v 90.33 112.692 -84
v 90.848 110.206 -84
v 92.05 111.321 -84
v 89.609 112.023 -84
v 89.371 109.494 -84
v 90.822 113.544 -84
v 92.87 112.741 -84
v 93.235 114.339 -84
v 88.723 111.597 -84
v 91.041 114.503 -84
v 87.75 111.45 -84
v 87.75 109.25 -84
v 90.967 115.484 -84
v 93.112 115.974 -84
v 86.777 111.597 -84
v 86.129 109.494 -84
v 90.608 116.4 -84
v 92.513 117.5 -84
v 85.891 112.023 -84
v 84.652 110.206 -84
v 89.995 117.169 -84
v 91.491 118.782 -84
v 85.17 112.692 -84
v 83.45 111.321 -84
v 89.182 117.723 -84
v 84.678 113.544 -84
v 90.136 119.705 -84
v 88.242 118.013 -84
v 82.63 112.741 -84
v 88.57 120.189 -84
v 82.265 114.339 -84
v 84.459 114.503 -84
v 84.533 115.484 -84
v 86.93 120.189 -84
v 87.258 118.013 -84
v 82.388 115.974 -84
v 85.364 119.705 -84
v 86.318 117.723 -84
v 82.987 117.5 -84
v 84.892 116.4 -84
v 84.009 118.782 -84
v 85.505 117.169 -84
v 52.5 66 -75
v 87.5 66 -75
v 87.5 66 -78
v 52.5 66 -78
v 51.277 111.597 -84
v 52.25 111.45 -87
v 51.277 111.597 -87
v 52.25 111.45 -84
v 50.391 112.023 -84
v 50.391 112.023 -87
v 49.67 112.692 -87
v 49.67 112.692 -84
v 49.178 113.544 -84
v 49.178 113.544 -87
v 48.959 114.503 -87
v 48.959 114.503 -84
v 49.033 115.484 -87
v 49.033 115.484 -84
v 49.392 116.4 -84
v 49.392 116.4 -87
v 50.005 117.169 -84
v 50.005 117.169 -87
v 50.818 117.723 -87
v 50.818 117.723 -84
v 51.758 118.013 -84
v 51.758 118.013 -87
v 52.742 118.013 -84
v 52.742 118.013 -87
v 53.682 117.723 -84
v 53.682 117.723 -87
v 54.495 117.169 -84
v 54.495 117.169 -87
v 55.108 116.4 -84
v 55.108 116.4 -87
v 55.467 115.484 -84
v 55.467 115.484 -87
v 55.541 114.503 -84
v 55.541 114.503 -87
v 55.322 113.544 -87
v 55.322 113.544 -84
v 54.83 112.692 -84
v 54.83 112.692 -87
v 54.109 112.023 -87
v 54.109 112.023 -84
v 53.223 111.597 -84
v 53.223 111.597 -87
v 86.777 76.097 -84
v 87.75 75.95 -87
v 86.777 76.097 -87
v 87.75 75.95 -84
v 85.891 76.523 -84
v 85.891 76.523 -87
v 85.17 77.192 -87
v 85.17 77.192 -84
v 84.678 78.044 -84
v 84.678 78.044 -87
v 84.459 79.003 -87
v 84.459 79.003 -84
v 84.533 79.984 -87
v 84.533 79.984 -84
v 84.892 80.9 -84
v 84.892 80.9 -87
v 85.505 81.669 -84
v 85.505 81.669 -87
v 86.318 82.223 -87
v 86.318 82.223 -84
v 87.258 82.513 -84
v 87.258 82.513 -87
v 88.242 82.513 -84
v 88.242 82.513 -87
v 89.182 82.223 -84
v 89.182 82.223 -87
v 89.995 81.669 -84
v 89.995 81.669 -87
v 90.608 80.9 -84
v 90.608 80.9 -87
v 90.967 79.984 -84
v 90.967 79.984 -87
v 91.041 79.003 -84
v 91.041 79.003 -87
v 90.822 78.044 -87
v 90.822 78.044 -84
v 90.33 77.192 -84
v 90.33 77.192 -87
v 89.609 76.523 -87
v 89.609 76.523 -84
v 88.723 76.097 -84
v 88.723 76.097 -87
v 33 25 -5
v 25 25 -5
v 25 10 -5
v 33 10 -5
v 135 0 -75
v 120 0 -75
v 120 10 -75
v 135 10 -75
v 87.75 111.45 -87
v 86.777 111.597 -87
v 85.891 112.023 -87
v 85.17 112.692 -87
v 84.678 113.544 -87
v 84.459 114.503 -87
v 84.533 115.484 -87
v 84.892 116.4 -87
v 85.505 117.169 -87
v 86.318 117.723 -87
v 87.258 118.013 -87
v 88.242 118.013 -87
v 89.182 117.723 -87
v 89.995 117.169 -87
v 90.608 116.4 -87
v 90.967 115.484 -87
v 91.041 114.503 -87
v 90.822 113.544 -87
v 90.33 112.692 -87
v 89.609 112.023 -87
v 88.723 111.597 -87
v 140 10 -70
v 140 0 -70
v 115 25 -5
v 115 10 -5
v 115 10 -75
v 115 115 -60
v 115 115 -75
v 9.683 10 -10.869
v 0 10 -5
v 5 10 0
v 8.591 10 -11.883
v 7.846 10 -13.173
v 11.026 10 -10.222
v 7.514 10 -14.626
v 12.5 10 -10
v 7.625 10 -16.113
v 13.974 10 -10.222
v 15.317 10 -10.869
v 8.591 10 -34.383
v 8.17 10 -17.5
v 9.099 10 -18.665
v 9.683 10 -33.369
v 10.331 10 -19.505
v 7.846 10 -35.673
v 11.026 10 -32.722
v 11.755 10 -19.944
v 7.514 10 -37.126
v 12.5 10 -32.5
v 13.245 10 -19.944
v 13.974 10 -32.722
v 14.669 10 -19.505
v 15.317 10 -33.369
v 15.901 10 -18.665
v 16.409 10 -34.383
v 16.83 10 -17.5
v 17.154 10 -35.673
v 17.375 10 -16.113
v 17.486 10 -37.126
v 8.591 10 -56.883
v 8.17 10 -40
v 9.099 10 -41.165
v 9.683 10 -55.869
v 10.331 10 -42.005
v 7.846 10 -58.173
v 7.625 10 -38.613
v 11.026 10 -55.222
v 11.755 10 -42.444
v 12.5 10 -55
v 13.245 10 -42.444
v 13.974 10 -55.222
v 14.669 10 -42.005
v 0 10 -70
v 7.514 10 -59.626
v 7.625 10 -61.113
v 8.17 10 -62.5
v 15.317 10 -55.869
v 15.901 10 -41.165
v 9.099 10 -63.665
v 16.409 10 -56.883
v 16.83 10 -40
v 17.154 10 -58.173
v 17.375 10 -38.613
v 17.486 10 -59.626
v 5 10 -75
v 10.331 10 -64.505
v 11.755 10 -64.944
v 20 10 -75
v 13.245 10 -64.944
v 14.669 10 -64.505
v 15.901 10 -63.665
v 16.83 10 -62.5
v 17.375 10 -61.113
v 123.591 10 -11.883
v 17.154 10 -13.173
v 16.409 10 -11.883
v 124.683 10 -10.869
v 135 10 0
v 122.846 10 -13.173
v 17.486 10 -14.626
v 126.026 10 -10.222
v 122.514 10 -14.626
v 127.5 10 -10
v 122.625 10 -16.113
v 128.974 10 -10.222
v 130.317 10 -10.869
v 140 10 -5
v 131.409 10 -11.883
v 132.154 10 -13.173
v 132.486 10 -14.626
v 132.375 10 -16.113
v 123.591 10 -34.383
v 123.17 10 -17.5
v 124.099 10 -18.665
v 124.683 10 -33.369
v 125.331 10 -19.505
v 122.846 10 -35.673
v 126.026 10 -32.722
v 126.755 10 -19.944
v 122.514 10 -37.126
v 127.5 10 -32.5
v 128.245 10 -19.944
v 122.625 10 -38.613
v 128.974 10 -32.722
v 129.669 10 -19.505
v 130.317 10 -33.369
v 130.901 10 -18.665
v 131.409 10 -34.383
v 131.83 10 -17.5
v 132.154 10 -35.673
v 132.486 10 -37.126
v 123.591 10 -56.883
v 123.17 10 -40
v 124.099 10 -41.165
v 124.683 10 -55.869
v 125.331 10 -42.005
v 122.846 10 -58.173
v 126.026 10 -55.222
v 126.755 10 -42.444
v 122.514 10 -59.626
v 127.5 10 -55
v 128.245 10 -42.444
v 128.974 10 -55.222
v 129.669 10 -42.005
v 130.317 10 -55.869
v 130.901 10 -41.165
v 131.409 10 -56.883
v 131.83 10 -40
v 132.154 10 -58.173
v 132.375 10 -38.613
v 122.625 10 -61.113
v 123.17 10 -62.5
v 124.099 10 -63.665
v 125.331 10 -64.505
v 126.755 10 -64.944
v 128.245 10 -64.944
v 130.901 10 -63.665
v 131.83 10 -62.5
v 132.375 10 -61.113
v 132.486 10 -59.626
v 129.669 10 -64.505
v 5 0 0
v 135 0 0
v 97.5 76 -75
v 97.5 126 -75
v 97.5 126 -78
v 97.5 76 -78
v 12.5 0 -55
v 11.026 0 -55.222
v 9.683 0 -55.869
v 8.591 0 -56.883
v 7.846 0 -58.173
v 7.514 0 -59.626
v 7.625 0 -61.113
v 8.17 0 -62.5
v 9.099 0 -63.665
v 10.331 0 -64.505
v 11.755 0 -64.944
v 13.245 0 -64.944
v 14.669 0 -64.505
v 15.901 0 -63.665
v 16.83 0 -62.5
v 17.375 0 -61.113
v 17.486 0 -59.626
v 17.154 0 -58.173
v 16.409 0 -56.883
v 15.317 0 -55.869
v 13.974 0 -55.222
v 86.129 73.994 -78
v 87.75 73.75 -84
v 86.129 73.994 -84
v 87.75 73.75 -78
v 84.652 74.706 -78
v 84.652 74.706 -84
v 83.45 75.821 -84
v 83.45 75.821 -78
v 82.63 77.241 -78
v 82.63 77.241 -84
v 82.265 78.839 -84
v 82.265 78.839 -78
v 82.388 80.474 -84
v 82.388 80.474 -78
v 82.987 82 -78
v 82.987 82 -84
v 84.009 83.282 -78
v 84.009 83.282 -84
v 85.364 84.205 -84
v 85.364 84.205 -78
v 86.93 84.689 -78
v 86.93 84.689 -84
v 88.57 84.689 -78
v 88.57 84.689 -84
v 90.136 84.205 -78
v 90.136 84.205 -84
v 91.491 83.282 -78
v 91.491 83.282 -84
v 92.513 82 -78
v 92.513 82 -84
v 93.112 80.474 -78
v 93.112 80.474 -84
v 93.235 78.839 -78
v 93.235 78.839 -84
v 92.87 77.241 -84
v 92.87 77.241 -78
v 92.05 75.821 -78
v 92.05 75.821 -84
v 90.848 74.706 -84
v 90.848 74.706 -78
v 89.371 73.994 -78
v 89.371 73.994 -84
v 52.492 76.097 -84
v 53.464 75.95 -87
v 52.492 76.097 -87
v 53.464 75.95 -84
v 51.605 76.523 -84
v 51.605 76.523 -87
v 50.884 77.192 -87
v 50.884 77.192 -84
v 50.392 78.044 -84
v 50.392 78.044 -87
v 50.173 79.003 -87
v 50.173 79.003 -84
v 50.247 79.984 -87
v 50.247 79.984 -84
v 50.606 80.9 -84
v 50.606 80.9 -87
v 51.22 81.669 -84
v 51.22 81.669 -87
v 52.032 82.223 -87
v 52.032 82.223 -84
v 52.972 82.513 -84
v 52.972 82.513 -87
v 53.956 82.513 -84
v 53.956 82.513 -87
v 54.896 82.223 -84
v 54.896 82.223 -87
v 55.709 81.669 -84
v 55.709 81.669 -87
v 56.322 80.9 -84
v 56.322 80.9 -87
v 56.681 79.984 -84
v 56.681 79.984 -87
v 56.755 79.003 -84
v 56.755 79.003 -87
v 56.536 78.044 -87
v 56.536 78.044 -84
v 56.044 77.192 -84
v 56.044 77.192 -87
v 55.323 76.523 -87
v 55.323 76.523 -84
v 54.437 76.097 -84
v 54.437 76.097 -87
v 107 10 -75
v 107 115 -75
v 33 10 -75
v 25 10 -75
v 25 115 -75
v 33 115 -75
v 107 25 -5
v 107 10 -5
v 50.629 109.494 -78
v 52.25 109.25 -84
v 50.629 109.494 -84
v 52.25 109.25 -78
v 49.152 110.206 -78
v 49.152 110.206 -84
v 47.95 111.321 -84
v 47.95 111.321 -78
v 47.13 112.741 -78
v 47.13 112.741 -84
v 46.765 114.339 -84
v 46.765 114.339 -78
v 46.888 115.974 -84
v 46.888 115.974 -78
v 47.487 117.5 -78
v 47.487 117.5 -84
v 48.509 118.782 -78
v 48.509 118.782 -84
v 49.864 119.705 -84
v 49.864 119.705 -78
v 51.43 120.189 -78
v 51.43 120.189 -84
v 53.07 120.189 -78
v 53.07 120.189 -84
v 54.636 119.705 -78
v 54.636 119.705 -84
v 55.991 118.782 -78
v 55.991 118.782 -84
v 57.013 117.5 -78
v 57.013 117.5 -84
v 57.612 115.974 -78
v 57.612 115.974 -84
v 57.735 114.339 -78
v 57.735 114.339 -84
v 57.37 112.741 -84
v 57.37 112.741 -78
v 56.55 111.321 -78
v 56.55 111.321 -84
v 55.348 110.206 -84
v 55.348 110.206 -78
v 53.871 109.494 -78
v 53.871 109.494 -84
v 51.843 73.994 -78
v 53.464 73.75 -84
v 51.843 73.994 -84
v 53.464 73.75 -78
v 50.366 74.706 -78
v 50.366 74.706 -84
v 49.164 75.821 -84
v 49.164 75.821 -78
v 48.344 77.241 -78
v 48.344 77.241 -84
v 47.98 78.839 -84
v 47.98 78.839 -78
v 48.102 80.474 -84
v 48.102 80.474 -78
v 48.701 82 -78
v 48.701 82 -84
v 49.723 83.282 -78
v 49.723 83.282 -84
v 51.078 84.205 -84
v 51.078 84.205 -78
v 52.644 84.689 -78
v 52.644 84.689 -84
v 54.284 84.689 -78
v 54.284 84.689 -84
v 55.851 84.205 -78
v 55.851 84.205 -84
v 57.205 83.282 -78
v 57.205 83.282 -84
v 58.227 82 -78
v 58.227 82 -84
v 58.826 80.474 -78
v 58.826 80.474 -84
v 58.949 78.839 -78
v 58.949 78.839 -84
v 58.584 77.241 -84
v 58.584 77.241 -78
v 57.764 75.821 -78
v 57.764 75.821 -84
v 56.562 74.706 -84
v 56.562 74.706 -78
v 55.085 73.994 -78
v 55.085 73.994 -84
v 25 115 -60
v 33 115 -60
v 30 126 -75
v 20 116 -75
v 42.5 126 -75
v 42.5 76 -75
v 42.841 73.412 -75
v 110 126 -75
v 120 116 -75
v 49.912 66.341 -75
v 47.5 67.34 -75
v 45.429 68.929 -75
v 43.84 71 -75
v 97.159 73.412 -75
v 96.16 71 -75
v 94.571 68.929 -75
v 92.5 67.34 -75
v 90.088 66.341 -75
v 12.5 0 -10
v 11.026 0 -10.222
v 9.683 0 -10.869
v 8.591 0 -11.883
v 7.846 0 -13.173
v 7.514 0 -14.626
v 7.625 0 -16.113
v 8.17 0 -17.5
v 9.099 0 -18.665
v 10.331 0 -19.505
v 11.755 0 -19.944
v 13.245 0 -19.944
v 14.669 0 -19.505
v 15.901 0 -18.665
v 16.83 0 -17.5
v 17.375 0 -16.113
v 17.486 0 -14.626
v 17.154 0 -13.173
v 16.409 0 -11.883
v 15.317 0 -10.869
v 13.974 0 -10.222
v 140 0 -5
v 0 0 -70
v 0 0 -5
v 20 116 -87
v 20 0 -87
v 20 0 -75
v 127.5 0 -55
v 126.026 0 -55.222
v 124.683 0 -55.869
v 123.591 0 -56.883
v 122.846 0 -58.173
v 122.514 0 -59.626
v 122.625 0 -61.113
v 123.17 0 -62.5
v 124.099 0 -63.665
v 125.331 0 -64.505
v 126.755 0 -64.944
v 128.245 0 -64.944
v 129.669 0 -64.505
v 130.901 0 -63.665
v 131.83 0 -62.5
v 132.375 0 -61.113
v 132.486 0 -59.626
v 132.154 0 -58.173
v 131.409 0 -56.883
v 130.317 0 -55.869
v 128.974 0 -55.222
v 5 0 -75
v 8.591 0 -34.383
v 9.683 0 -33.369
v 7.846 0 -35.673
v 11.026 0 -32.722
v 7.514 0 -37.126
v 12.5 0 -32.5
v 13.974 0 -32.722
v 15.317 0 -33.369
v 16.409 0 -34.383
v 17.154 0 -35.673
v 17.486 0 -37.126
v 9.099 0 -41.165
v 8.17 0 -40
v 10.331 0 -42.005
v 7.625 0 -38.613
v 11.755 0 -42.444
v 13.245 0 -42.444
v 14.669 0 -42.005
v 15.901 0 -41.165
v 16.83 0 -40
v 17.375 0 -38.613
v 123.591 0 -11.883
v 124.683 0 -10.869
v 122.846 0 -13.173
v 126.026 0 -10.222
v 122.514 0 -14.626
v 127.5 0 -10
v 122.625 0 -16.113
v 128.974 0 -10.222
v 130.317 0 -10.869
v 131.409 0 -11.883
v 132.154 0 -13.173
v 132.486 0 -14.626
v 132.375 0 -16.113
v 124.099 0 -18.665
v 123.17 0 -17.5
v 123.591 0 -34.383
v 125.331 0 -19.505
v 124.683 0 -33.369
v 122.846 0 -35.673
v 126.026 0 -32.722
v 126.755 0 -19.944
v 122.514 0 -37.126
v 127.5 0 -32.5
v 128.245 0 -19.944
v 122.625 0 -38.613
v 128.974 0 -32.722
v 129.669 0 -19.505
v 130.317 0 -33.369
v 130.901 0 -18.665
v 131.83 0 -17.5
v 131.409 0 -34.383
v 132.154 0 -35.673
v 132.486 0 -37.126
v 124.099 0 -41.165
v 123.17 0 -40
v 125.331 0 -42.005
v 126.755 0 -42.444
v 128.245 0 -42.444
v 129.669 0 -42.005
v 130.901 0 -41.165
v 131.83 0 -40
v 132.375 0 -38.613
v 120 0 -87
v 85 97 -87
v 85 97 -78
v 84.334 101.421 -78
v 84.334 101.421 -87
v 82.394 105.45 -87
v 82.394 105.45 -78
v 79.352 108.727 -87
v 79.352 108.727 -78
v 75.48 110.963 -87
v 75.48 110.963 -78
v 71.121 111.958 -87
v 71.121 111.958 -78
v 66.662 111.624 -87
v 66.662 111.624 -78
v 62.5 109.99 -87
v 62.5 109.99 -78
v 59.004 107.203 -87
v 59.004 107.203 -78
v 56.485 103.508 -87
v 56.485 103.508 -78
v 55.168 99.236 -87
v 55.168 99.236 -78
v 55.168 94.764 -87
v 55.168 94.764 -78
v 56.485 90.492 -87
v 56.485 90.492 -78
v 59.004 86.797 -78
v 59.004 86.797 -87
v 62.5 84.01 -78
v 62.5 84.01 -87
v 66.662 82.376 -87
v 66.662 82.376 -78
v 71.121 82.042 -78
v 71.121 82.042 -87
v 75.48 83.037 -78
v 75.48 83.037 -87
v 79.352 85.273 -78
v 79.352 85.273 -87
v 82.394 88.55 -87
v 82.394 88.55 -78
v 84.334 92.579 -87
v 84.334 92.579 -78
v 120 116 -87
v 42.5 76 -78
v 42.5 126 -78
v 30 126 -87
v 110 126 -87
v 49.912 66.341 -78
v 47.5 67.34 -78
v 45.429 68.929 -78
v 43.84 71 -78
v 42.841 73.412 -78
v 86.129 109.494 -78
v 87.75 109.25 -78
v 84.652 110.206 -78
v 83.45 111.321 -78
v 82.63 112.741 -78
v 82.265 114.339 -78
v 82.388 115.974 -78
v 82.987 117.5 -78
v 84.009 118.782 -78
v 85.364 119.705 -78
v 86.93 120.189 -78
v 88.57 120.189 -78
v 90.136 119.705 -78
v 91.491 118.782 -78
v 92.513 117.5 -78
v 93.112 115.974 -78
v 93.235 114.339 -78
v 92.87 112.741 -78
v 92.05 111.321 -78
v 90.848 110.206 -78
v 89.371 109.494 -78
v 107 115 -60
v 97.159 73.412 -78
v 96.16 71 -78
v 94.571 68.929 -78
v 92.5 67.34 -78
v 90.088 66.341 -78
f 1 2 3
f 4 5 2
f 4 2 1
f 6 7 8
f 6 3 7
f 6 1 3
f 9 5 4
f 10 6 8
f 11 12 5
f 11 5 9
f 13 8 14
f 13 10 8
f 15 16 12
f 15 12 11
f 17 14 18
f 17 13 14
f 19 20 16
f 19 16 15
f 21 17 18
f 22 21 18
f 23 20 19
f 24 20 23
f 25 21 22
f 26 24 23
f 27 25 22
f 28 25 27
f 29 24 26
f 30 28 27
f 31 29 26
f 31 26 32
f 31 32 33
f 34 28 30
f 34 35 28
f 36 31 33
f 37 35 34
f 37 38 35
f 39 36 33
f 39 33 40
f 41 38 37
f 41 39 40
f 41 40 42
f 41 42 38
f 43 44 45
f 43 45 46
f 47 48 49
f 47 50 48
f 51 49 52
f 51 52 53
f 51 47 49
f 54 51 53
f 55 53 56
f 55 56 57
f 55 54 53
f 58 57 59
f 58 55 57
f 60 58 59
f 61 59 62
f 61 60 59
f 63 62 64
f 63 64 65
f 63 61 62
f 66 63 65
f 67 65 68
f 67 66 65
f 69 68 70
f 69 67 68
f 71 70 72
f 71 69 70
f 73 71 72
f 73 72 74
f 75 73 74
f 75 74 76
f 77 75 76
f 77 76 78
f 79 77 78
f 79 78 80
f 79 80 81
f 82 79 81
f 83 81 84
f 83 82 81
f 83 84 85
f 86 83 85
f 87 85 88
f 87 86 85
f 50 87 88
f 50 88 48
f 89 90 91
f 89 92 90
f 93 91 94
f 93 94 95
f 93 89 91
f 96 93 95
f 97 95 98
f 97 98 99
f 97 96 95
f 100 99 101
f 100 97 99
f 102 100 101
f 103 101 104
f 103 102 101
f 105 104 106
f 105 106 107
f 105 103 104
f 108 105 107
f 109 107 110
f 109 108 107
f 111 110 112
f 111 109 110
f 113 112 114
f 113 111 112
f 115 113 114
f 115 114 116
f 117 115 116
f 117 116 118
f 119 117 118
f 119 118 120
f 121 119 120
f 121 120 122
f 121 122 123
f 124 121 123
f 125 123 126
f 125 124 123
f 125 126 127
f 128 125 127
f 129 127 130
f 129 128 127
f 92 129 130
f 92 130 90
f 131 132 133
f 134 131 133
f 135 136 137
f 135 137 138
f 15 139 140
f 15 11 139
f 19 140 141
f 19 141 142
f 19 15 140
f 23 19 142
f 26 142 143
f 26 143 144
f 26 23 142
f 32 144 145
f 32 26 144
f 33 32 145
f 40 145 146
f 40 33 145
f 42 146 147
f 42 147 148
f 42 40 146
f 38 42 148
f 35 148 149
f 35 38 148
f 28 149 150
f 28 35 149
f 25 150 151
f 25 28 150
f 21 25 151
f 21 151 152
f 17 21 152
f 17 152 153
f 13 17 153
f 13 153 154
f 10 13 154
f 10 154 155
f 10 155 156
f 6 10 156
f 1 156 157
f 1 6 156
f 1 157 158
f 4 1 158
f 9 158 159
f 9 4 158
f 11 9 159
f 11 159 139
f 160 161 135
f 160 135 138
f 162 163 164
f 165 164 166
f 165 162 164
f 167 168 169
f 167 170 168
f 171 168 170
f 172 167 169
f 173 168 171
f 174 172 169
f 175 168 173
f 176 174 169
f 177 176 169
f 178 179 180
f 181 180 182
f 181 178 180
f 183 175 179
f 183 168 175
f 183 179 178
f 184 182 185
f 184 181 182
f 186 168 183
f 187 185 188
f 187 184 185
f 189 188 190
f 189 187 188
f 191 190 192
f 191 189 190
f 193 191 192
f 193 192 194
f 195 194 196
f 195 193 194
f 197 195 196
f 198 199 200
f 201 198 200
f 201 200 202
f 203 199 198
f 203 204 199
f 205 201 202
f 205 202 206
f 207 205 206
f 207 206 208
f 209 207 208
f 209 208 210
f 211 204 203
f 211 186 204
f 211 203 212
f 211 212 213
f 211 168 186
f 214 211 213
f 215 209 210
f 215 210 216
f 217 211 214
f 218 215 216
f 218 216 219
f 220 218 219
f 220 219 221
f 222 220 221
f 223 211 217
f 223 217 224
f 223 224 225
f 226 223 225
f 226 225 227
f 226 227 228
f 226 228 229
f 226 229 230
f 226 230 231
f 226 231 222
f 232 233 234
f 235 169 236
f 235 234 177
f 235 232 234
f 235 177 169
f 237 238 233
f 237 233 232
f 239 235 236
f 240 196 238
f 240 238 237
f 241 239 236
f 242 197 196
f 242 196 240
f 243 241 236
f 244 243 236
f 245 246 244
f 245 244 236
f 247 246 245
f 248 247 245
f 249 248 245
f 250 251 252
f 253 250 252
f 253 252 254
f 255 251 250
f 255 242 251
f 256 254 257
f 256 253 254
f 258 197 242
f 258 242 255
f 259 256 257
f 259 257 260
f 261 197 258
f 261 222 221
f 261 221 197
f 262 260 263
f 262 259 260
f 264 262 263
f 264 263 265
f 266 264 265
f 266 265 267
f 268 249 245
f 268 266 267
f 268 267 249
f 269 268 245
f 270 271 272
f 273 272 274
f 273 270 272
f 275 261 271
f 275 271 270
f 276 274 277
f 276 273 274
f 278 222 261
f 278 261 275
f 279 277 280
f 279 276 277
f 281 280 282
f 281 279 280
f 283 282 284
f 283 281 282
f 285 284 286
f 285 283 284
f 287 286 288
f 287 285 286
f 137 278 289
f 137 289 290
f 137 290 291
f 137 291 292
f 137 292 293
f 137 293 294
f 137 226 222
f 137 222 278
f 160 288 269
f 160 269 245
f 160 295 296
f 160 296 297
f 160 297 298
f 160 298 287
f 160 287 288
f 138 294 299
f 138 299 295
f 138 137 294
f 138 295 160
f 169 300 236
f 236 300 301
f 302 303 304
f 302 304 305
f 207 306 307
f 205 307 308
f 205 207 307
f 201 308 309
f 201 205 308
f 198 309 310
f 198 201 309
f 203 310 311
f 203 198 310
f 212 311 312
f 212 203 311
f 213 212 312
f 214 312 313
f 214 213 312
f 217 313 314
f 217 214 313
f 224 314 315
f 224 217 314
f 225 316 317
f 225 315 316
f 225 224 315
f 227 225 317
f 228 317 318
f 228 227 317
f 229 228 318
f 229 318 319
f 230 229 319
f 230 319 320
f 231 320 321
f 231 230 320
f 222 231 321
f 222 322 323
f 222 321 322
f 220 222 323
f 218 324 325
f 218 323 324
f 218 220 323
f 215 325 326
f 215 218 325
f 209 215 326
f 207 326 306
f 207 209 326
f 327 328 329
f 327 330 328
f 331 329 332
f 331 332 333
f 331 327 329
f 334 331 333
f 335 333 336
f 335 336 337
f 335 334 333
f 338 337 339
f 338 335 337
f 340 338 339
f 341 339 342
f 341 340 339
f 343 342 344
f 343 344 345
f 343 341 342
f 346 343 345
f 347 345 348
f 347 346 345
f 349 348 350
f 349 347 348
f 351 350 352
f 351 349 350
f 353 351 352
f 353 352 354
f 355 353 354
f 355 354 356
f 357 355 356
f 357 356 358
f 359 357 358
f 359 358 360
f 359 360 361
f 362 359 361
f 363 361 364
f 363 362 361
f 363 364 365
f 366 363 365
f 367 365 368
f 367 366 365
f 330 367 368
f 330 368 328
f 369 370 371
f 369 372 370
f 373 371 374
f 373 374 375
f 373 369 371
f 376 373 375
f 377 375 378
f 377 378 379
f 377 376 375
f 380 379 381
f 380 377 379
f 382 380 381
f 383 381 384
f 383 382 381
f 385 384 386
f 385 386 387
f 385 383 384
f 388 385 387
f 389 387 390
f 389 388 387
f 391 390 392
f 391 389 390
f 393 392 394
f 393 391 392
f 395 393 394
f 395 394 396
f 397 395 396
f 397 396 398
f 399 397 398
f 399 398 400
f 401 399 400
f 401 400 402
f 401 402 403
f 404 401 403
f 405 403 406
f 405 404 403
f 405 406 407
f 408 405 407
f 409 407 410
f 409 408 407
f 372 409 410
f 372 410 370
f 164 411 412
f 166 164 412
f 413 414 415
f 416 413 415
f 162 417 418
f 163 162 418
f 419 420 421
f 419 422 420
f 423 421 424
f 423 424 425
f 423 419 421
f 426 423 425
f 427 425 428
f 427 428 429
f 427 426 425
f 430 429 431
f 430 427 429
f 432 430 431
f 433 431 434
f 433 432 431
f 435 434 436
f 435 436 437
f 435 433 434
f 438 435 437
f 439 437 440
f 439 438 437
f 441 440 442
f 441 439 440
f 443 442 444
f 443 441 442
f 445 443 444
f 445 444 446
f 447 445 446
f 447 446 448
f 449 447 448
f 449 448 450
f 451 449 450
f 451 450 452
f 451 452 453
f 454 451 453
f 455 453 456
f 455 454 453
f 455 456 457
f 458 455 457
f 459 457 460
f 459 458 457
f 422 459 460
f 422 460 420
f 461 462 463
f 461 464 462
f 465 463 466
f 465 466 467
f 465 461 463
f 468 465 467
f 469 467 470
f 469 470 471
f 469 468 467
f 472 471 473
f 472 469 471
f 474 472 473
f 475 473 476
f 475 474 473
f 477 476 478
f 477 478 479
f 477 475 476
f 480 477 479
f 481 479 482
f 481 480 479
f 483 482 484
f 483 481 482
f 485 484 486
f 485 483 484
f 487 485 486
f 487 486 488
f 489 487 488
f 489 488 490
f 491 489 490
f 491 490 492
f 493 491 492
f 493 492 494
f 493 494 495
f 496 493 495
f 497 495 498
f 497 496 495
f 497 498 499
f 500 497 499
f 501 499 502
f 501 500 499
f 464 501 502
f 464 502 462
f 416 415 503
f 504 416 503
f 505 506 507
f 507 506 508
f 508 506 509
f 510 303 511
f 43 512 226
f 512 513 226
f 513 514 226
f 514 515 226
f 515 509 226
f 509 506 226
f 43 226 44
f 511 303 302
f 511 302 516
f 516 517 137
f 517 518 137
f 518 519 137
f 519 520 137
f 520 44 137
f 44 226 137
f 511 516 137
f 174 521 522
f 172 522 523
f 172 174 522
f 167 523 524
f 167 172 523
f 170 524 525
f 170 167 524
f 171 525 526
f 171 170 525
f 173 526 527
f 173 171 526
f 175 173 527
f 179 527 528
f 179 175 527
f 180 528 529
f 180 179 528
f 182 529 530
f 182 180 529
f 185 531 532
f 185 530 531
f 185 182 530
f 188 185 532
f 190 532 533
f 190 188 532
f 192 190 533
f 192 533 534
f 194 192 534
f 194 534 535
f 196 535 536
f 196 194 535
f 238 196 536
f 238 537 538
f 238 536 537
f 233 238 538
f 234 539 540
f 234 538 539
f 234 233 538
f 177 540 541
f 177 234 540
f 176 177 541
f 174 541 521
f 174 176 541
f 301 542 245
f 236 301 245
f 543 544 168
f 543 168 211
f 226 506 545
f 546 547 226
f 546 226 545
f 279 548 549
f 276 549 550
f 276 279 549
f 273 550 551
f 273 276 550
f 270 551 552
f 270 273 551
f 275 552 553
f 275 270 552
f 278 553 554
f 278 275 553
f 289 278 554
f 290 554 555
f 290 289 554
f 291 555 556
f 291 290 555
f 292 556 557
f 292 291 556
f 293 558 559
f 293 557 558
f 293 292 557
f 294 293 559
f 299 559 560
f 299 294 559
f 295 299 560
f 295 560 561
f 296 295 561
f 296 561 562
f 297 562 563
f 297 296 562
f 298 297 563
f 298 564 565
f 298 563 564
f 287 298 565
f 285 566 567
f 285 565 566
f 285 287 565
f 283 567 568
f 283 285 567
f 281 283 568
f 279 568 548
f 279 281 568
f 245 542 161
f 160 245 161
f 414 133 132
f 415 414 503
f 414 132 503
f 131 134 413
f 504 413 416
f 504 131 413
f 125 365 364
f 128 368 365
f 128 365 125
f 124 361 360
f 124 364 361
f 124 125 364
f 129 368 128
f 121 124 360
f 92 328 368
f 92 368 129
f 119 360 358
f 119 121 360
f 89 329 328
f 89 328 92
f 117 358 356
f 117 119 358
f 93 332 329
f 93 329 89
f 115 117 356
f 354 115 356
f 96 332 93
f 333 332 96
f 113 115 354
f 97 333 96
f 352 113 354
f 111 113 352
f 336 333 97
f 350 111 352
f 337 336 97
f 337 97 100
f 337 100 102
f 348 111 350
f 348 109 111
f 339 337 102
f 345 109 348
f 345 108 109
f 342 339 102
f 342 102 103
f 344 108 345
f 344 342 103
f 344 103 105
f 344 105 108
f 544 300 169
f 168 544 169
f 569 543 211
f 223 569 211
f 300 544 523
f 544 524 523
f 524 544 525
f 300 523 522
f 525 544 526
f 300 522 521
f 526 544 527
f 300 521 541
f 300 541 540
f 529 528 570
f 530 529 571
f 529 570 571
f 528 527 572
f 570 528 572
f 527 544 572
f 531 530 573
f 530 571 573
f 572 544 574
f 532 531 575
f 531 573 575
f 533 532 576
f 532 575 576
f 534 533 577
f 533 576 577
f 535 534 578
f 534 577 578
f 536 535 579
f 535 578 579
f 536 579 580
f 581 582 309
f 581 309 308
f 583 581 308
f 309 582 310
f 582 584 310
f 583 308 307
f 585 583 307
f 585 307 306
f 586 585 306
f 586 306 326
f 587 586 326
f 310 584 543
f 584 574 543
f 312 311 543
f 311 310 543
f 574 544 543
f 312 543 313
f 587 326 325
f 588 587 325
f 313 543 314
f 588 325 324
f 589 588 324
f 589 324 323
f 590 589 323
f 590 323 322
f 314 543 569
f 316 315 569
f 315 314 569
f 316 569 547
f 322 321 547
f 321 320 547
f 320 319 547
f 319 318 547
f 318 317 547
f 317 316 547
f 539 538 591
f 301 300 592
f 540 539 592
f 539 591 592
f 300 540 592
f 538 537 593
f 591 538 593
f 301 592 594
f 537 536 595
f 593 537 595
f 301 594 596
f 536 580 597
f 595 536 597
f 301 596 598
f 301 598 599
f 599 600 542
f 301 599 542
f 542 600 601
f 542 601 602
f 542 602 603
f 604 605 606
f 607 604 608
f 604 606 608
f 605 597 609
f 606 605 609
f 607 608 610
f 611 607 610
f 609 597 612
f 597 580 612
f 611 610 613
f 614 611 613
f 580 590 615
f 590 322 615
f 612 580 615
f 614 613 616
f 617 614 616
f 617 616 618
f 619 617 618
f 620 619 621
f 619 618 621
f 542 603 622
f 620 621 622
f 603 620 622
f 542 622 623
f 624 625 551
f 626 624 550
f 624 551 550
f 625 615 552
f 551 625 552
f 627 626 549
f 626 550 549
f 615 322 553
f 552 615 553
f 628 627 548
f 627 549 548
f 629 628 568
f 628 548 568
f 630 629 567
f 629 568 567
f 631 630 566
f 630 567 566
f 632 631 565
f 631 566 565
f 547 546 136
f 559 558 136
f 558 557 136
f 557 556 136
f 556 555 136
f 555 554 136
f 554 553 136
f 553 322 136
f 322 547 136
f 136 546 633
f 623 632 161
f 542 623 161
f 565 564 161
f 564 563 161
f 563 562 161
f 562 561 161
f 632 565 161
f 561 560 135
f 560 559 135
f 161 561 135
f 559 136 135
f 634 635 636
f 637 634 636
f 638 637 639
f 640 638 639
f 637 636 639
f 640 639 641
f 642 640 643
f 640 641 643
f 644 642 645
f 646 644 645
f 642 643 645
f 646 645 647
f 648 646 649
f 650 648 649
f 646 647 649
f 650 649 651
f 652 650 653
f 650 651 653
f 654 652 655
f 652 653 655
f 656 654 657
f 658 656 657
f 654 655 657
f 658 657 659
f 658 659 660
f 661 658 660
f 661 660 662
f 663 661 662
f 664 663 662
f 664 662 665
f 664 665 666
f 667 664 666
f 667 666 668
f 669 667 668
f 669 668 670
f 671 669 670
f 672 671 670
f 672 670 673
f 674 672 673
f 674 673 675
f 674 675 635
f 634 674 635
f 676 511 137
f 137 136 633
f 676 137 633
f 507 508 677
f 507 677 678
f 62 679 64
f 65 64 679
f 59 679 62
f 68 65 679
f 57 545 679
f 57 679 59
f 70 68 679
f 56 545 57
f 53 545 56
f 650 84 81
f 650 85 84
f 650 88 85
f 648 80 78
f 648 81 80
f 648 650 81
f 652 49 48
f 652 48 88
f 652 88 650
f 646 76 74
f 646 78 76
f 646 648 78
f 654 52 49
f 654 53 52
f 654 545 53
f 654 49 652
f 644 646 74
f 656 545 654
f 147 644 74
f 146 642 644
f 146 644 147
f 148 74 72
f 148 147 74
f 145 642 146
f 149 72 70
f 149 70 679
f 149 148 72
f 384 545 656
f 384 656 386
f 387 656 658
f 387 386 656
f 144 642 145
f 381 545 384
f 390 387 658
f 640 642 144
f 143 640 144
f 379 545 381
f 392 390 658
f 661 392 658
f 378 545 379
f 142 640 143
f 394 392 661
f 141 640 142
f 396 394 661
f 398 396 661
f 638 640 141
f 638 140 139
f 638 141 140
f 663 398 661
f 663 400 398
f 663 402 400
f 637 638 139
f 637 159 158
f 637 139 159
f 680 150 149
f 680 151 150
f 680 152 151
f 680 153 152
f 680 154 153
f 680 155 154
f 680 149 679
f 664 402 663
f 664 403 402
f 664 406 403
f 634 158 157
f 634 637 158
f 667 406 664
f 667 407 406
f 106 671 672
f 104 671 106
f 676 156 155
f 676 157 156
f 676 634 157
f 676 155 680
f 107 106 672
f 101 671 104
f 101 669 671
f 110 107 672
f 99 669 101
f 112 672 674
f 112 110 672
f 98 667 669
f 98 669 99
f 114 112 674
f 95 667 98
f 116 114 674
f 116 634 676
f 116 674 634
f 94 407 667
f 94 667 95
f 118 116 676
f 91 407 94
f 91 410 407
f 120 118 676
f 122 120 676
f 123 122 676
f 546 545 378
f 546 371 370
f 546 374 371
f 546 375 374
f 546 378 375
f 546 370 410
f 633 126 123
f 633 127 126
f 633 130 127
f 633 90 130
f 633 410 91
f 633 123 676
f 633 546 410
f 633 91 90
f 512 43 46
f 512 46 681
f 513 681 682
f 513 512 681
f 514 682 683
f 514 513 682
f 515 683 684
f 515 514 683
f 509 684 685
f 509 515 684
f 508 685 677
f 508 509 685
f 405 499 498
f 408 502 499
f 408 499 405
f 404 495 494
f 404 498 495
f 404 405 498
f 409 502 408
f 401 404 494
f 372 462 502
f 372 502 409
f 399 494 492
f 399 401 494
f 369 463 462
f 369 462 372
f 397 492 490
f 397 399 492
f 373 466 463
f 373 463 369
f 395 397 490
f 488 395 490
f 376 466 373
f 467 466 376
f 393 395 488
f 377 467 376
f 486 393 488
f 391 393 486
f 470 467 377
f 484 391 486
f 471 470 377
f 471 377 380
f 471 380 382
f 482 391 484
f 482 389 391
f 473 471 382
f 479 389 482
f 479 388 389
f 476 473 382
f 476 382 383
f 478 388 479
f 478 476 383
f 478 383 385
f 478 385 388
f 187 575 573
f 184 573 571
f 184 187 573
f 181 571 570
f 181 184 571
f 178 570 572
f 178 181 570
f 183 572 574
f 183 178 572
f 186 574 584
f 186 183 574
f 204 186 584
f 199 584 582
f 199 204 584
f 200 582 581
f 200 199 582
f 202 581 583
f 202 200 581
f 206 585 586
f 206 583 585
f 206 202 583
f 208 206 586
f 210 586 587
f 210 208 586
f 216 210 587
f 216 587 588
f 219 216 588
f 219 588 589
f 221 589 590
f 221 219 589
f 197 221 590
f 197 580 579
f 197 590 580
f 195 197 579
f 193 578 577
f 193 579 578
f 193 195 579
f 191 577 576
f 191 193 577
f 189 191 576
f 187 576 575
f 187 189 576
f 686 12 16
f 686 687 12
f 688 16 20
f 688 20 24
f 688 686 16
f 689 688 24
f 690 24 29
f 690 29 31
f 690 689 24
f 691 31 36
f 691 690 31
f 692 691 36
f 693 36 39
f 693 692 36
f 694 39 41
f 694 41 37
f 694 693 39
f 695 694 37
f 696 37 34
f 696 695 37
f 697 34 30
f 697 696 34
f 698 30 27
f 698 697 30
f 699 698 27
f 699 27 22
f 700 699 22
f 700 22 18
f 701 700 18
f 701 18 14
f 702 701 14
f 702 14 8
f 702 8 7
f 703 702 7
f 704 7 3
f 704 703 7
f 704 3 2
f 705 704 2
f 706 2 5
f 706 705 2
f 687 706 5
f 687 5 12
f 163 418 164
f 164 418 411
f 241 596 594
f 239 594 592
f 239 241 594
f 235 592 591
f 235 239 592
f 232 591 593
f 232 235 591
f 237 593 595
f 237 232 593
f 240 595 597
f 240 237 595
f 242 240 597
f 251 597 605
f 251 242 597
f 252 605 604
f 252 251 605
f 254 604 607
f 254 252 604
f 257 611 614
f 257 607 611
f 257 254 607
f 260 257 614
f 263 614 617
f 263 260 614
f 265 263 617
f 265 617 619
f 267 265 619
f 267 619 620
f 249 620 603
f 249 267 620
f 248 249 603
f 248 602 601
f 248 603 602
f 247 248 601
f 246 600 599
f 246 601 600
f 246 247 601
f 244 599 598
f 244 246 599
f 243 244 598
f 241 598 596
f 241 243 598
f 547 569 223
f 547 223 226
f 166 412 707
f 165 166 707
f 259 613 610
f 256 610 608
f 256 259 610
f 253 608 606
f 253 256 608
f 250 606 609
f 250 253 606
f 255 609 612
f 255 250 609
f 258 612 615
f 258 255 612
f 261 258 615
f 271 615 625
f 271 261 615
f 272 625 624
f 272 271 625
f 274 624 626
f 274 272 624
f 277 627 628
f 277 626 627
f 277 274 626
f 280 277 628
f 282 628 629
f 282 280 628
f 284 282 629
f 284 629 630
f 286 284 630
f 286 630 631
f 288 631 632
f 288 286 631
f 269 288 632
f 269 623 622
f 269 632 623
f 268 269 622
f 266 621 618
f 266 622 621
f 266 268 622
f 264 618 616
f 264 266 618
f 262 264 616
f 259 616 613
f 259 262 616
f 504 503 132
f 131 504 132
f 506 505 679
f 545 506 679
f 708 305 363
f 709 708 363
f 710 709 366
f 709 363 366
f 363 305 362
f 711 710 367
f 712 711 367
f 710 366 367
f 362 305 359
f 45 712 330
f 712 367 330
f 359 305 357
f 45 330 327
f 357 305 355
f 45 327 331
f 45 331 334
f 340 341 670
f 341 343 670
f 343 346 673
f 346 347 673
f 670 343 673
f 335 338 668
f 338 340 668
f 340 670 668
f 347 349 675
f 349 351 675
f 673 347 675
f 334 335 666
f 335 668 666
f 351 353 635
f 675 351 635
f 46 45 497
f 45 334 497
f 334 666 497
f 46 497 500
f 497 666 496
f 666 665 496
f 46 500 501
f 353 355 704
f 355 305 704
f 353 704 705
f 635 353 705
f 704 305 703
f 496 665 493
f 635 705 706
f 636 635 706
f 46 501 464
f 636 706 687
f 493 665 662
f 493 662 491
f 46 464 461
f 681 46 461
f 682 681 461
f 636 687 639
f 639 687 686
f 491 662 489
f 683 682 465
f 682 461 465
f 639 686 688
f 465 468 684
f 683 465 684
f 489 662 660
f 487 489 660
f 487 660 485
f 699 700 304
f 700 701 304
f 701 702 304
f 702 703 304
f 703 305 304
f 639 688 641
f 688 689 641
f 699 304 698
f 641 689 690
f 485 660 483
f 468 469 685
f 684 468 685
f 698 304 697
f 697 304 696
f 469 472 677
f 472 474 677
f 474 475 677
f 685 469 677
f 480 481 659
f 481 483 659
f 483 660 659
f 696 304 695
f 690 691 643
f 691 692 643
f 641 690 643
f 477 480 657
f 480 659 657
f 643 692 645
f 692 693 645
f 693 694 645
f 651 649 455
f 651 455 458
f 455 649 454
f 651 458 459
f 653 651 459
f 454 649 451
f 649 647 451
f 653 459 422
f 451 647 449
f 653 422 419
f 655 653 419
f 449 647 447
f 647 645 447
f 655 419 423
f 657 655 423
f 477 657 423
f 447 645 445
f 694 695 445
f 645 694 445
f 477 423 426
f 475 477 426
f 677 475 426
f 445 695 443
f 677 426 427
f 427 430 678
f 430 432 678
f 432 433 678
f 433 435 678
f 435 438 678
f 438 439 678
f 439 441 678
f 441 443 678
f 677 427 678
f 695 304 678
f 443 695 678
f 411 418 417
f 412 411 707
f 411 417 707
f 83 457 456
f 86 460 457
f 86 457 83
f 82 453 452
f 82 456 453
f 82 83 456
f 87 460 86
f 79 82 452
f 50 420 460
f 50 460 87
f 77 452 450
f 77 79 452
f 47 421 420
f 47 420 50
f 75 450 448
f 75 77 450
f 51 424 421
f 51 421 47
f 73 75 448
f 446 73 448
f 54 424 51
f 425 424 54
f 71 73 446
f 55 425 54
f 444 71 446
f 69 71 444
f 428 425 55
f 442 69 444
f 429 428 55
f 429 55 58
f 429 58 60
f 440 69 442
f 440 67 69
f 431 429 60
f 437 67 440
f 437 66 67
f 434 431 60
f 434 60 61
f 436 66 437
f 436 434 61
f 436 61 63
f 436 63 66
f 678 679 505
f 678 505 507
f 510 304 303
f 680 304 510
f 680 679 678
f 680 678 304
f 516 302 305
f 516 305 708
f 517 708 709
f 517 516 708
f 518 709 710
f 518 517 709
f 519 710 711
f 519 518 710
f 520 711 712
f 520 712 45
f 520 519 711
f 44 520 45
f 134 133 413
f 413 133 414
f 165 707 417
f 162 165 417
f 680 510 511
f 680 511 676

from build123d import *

# Parameters (mm, degrees)
SKETCH1_W                                    = 140
SKETCH1_H                                    = 75
BOSS_EXTRUDE1_DEPTH                          = 10
SKETCH2_W                                    = 100
SKETCH2_H                                    = 12
BOSS_EXTRUDE2_DEPTH                          = 126
GUSSET1_START                                = 25
GUSSET1_DEPTH                                = 8
GUSSET2_START                                = 107
GUSSET2_DEPTH                                = 8
F_10_0MM_DOWEL_HOLE1_AT_2_COUNT              = 2
F_10_0MM_DOWEL_HOLE1_AT_2_PITCH              = 115
F_10_0MM_DOWEL_HOLE2_AT_2_COUNT              = 2
F_10_0MM_DOWEL_HOLE2_AT_2_PITCH              = 45
F_10_0MM_DOWEL_HOLE2_AT_3_COUNT              = 2
F_10_0MM_DOWEL_HOLE2_AT_3_PITCH              = 115
F_10_0MM_DOWEL_HOLE2_AT_4_COUNT              = 2
F_10_0MM_DOWEL_HOLE2_AT_4_PITCH              = 123.490890352
CUT_EXTRUDE1_DEPTH                           = 3
SKETCH15_R                                   = 15
CUT_EXTRUDE2_DEPTH                           = 204.862698893
CBORE_FOR_M5_HEX_SOCKET_HEAD_CAP_SCR_2_COUNT = 2
CBORE_FOR_M5_HEX_SOCKET_HEAD_CAP_SCR_2_PITCH = 35.5
CBORE_FOR_M5_HEX_SOCKET_HEAD_CAP_SCR_3_COUNT = 2
CBORE_FOR_M5_HEX_SOCKET_HEAD_CAP_SCR_3_PITCH = 50.204581464
CBORE_FOR_M5_HEX_SOCKET_HEAD_CAP_SCR_4_COUNT = 2
CBORE_FOR_M5_HEX_SOCKET_HEAD_CAP_SCR_4_PITCH = 35.520758797
CHAMFER1_SIZE                                = 5
CHAMFER2_SIZE                                = 10


# Read off the part's stored shape, not the designer's step: Gusset1, Gusset2
with BuildPart() as part:
    # Sketch1 → Boss-Extrude1 (new body)
    with BuildSketch(Plane(origin=(0, 0, 0), x_dir=(1, 0, 0), z_dir=(0, 1, 0))):
        with Locations((70, 37.5)):
            Rectangle(SKETCH1_W, SKETCH1_H)
    extrude(amount=BOSS_EXTRUDE1_DEPTH)

    # Sketch2 → Boss-Extrude2 (add)
    with BuildSketch(Plane(origin=(0, 0, 0), x_dir=(1, 0, 0), z_dir=(0, 1, 0))):
        with Locations((70, 81)):
            Rectangle(SKETCH2_W, SKETCH2_H)
    extrude(amount=BOSS_EXTRUDE2_DEPTH)

    # Sketch7 → Ø10.0mm Dowel Hole1 (revolve, cut)
    with BuildSketch(Plane(origin=(12.5, 10, -37.5), x_dir=(0, 0, 1), z_dir=(1, 0, 0))):
        Polygon((0, 0), (0, 19.004303095), (5, 16), (5, 0), align=None)
    f_10_0mm_dowel_hole1 = revolve(axis=Axis((12.5, 16.35, -37.5), (0, -1, 0)), mode=Mode.SUBTRACT)

    # Ø10.0mm Dowel Hole1 at 2: Ø10.0mm Dowel Hole1 ×2
    with Locations(*[(i * F_10_0MM_DOWEL_HOLE1_AT_2_PITCH, 0, 0) for i in range(1, F_10_0MM_DOWEL_HOLE1_AT_2_COUNT)]):
        add(f_10_0mm_dowel_hole1, mode=Mode.SUBTRACT)

    # Sketch13 → Ø10.0mm Dowel Hole2 (revolve, cut)
    with BuildSketch(Plane(origin=(12.5, 10, -60), x_dir=(0, 0, 1), z_dir=(1, 0, 0))):
        Polygon((0, 0), (0, 32.254303095), (5, 29.25), (5, 0), align=None)
    f_10_0mm_dowel_hole2 = revolve(axis=Axis((12.5, 16.35, -60), (0, -1, 0)), mode=Mode.SUBTRACT)

    # Ø10.0mm Dowel Hole2 at 2: Ø10.0mm Dowel Hole2 ×2
    with Locations(*[(0, 0, i * F_10_0MM_DOWEL_HOLE2_AT_2_PITCH) for i in range(1, F_10_0MM_DOWEL_HOLE2_AT_2_COUNT)]):
        add(f_10_0mm_dowel_hole2, mode=Mode.SUBTRACT)

    # Ø10.0mm Dowel Hole2 at 3: Ø10.0mm Dowel Hole2 ×2
    with Locations(*[(i * F_10_0MM_DOWEL_HOLE2_AT_3_PITCH, 0, 0) for i in range(1, F_10_0MM_DOWEL_HOLE2_AT_3_COUNT)]):
        add(f_10_0mm_dowel_hole2, mode=Mode.SUBTRACT)

    # Ø10.0mm Dowel Hole2 at 4: Ø10.0mm Dowel Hole2 ×2
    with Locations(*[Vector(0.9312427797057534, 0, 0.3643993485805122) * (i * F_10_0MM_DOWEL_HOLE2_AT_4_PITCH) for i in range(1, F_10_0MM_DOWEL_HOLE2_AT_4_COUNT)]):
        add(f_10_0mm_dowel_hole2, mode=Mode.SUBTRACT)

    # Sketch14 → Cut-Extrude1 (cut)
    with BuildSketch(Plane.XY.offset(-75)):
        with BuildLine():
            Line((42.5, 126), (97.5, 126))
            Line((97.5, 126), (97.5, 76))
            ThreePointArc((97.5, 76), (94.571067812, 68.928932188), (87.5, 66))
            Line((87.5, 66), (52.5, 66))
            ThreePointArc((52.5, 66), (45.428932188, 68.928932188), (42.5, 76))
            Line((42.5, 76), (42.5, 126))
        make_face()
    extrude(amount=-CUT_EXTRUDE1_DEPTH, mode=Mode.SUBTRACT)

    # Sketch15 → Cut-Extrude2 (cut, through all)
    with BuildSketch(Plane.XY.offset(-78)):
        with Locations((70, 97)):
            Circle(SKETCH15_R)
    extrude(amount=-CUT_EXTRUDE2_DEPTH, mode=Mode.SUBTRACT)

    # Sketch20 → CBORE for M5 Hex Socket Head Cap Screw1 (revolve, cut)
    with BuildSketch(Plane(origin=(52.25, 114.75, -78), x_dir=(0, -1, 0), z_dir=(1, 0, 0))):
        Polygon((0, 0), (0, 9), (3.3, 9), (3.3, 6), (5.5, 6), (5.5, 0), align=None)
    cbore_for_m5_hex_socket_head_cap_screw1 = revolve(axis=Axis((52.25, 114.75, -71.65), (0, 0, -1)), mode=Mode.SUBTRACT)

    # CBORE for M5 Hex Socket Head Cap Scr 2: CBORE for M5 Hex Socket Head Cap Screw1 ×2
    with Locations(*[(i * CBORE_FOR_M5_HEX_SOCKET_HEAD_CAP_SCR_2_PITCH, 0, 0) for i in range(1, CBORE_FOR_M5_HEX_SOCKET_HEAD_CAP_SCR_2_COUNT)]):
        add(cbore_for_m5_hex_socket_head_cap_screw1, mode=Mode.SUBTRACT)

    # CBORE for M5 Hex Socket Head Cap Scr 3: CBORE for M5 Hex Socket Head Cap Screw1 ×2
    with Locations(*[Vector(0.7071067811865476, -0.7071067811865475, 0) * (i * CBORE_FOR_M5_HEX_SOCKET_HEAD_CAP_SCR_3_PITCH) for i in range(1, CBORE_FOR_M5_HEX_SOCKET_HEAD_CAP_SCR_3_COUNT)]):
        add(cbore_for_m5_hex_socket_head_cap_screw1, mode=Mode.SUBTRACT)

    # CBORE for M5 Hex Socket Head Cap Scr 4: CBORE for M5 Hex Socket Head Cap Screw1 ×2
    with Locations(*[Vector(0.034183104868825386, -0.9994155869014286, 0) * (i * CBORE_FOR_M5_HEX_SOCKET_HEAD_CAP_SCR_4_PITCH) for i in range(1, CBORE_FOR_M5_HEX_SOCKET_HEAD_CAP_SCR_4_COUNT)]):
        add(cbore_for_m5_hex_socket_head_cap_screw1, mode=Mode.SUBTRACT)

    # Chamfer1
    chamfer1_edges = [part.edges().sort_by_distance(p)[0] for p in [
        (0, 5, -75),
        (140, 5, -75),
        (140, 5, 0),
        (0, 5, 0),
    ]]
    chamfer(chamfer1_edges, length=CHAMFER1_SIZE)

    # Chamfer2
    chamfer2_edges = [part.edges().sort_by_distance(p)[0] for p in [
        (20, 126, -81),
        (120, 126, -81),
    ]]
    chamfer(chamfer2_edges, length=CHAMFER2_SIZE)


with BuildPart() as body_2:
    # Gusset1 outline → Gusset1 (new body)
    with BuildSketch(Plane.YZ.offset(GUSSET1_START)):
        Polygon((115, -75), (115, -60), (25, -5), (10, -5), (10, -75), align=None)
    extrude(amount=GUSSET1_DEPTH)


with BuildPart() as body_3:
    # Gusset2 outline → Gusset2 (new body)
    with BuildSketch(Plane.YZ.offset(GUSSET2_START)):
        Polygon((115, -75), (115, -60), (25, -5), (10, -5), (10, -75), align=None)
    extrude(amount=GUSSET2_DEPTH)


solid = Compound([part.part, body_2.part, body_3.part])
